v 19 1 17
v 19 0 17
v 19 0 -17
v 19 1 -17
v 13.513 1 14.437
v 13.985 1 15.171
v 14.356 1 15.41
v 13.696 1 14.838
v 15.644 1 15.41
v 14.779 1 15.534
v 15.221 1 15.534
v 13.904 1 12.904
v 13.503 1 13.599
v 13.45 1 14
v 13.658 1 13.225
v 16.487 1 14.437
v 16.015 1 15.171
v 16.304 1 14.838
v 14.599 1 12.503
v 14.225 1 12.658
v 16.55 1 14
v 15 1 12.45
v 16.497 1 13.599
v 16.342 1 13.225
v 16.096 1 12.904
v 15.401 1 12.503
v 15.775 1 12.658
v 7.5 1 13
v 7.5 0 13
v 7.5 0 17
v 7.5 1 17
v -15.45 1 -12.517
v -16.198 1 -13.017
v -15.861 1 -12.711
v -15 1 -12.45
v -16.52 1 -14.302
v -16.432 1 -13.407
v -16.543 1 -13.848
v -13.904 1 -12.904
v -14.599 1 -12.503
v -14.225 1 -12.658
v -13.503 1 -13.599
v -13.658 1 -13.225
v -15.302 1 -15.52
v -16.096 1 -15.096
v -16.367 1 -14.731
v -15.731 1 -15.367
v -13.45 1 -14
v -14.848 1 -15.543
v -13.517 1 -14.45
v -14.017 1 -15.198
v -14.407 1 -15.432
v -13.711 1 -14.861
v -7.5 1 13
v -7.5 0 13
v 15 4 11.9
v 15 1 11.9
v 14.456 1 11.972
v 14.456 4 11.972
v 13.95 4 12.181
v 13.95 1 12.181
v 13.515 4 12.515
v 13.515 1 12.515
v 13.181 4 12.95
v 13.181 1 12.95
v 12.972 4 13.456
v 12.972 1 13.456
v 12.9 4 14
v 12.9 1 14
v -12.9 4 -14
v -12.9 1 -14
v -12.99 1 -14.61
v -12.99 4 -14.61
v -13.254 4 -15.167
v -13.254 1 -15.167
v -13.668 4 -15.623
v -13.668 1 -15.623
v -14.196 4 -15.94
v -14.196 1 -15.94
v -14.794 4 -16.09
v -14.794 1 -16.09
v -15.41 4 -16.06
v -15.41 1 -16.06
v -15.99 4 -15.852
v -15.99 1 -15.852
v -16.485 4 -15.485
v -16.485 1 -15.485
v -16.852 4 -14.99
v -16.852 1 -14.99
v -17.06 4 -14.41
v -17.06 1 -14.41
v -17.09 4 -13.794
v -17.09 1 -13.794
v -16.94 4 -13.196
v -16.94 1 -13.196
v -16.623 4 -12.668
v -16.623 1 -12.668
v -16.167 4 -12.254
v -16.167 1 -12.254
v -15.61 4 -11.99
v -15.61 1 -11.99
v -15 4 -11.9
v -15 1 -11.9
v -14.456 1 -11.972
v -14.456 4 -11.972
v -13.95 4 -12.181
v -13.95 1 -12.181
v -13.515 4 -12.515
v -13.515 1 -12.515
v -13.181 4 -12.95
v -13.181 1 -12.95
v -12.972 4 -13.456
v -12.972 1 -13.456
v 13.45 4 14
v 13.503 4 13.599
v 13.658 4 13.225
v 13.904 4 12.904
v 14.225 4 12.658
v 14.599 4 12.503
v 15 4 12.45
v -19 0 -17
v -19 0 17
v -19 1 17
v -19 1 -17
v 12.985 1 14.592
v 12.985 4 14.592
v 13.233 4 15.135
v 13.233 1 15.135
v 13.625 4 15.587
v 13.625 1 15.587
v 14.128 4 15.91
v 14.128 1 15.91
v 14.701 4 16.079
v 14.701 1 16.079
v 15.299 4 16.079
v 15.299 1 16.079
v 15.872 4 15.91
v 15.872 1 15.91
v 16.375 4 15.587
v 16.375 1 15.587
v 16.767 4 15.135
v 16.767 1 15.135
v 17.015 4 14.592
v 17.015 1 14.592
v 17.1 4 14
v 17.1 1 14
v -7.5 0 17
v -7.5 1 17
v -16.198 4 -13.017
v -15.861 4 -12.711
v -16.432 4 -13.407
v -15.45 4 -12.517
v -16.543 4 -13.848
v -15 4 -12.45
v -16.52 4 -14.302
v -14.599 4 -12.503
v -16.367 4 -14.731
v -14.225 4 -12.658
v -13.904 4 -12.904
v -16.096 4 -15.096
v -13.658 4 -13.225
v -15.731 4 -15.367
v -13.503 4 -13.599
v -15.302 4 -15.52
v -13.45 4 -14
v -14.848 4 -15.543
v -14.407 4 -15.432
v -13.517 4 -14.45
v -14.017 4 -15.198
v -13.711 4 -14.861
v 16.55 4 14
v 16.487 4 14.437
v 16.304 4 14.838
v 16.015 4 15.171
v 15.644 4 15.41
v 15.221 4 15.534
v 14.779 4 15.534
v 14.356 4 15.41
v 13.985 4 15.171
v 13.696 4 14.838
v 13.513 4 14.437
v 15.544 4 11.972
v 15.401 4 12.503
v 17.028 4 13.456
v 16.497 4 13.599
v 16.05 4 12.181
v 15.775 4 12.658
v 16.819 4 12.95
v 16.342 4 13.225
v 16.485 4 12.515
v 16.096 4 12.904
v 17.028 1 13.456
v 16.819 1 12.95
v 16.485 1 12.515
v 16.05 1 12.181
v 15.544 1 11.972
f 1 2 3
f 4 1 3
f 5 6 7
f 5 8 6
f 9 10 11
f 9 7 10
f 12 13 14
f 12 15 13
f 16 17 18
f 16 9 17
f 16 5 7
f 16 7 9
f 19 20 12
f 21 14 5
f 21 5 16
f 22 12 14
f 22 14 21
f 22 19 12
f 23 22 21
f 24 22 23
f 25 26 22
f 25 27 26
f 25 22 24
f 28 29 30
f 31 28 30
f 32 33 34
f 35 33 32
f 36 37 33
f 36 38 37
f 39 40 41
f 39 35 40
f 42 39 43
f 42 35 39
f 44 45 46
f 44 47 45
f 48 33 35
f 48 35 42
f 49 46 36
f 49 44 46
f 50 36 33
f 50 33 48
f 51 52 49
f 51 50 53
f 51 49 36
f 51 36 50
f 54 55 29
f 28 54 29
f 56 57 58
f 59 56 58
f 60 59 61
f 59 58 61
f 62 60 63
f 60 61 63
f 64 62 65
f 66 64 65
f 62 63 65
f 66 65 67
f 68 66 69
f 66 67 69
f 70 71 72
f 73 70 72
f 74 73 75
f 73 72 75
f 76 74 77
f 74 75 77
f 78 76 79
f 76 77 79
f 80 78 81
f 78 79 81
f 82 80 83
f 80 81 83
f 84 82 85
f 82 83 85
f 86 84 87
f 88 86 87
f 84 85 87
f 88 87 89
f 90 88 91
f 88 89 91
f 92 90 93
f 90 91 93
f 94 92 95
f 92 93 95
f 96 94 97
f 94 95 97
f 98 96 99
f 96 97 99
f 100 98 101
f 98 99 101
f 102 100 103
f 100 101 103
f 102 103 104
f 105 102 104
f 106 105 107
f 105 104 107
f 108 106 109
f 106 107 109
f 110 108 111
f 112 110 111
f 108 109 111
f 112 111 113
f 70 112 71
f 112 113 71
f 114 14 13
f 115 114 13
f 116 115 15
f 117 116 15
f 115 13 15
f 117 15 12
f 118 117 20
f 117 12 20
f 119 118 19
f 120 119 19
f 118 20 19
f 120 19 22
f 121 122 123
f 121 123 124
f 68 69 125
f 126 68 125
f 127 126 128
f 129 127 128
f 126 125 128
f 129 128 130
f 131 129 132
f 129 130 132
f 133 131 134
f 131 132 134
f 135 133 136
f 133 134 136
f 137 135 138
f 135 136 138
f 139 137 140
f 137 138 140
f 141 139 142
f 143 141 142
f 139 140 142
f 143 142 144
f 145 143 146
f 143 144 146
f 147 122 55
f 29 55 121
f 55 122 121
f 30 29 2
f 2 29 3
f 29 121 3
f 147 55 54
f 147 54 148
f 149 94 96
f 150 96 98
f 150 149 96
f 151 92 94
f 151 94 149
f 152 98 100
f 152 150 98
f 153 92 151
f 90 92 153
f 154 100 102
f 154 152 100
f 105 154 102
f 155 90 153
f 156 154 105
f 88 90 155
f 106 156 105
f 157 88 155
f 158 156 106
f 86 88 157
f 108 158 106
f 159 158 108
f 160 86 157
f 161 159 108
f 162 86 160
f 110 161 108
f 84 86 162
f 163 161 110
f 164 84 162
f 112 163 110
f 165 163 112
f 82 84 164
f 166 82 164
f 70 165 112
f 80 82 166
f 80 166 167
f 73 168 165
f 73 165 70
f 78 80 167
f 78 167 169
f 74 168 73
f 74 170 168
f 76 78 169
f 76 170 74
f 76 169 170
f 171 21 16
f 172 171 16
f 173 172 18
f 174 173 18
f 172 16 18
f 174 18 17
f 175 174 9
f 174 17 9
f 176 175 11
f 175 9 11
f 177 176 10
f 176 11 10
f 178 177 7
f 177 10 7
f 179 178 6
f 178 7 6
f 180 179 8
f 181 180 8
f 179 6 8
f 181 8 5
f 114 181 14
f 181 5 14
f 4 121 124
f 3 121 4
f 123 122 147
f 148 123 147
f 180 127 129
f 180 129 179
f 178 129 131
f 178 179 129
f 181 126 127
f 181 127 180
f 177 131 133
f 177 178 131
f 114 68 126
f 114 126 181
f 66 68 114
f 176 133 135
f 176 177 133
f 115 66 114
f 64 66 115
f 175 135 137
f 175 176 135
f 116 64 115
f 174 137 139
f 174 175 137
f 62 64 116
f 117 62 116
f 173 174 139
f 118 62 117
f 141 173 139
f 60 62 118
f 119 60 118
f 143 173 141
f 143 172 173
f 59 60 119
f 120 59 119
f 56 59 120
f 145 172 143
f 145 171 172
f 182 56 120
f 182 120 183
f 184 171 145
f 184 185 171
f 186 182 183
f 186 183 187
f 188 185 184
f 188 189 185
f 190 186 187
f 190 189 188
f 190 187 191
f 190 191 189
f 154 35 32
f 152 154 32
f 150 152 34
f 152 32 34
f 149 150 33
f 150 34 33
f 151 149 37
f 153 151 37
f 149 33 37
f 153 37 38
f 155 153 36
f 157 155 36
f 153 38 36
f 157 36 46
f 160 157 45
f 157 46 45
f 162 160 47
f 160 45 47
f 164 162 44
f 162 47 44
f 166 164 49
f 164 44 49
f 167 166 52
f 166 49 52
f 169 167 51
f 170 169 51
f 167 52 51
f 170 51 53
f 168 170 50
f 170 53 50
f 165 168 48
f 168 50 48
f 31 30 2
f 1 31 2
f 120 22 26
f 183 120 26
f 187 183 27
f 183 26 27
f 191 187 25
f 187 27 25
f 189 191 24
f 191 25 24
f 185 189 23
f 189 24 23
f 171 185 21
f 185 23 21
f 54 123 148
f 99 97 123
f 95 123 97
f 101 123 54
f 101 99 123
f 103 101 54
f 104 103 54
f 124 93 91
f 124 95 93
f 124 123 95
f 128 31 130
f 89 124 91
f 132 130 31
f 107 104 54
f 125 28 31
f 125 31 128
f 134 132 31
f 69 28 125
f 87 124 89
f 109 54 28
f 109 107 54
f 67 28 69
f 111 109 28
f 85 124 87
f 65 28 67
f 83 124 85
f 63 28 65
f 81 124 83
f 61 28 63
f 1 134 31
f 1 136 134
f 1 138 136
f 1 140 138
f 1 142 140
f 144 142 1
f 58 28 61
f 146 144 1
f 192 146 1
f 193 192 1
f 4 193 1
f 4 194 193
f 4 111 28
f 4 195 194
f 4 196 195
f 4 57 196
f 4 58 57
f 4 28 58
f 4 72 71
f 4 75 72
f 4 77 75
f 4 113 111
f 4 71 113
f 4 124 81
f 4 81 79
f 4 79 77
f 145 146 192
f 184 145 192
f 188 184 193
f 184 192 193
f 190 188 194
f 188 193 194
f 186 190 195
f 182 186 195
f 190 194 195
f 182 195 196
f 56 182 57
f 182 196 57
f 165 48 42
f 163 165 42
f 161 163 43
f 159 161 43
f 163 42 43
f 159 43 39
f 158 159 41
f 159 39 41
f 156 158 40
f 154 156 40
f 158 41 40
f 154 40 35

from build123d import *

# Parameters (mm, degrees)
SKETCH_1_W          = 38
SKETCH_1_H          = 34
MIDDLE_PLATE_DEPTH  = 1
MIDDLE_PILLAR_DEPTH = 3
C_CUT_REACH         = 27.807
SKETCH_3_W          = 15
SKETCH_3_H          = 4


with BuildPart() as part:
    # 스케치1 → Middle_plate (new body)
    with BuildSketch(Plane(origin=(0, 0, 0), x_dir=(1, 0, 0), z_dir=(0, 1, 0))):
        Rectangle(SKETCH_1_W, SKETCH_1_H)
    extrude(amount=MIDDLE_PLATE_DEPTH)

    # 스케치2 → Middle_pillar (add)
    with BuildSketch(Plane(origin=(0, 1, 0), x_dir=(1, 0, 0), z_dir=(0, 1, 0))):
        with BuildLine():
            ThreePointArc((17.1, -14), (16.48492424, -12.51507576), (15, -11.9))
            Line((15, -11.9), (15, -12.45))
            ThreePointArc((15, -12.45), (16.096015511, -12.903984489), (16.55, -14))
            ThreePointArc((16.55, -14), (15, -15.55), (13.45, -14))
            Line((13.45, -14), (12.9, -14))
            ThreePointArc((12.9, -14), (15, -16.1), (17.1, -14))
        make_face()
        with BuildLine():
            Line((15, -12.45), (15, -11.9))
            ThreePointArc((15, -11.9), (13.51507576, -12.51507576), (12.9, -14))
            Line((12.9, -14), (13.45, -14))
            ThreePointArc((13.45, -14), (13.903984489, -12.903984489), (15, -12.45))
        make_face()
        with BuildLine():
            ThreePointArc((-15, 12.45), (-16.096015511, 15.096015511), (-13.45, 14))
            Line((-13.45, 14), (-12.9, 14))
            ThreePointArc((-12.9, 14), (-16.48492424, 15.48492424), (-15, 11.9))
            Line((-15, 11.9), (-15, 12.45))
        make_face()
        with BuildLine():
            Line((-12.9, 14), (-13.45, 14))
            ThreePointArc((-13.45, 14), (-13.903984489, 12.903984489), (-15, 12.45))
            Line((-15, 12.45), (-15, 11.9))
            ThreePointArc((-15, 11.9), (-13.51507576, 12.51507576), (-12.9, 14))
        make_face()
    extrude(amount=MIDDLE_PILLAR_DEPTH)

    # 스케치3 → C_cut (cut, up to next)
    with BuildSketch(Plane.XZ, mode=Mode.PRIVATE) as c_cut_sk1:
        with Locations((0, 15)):
            Rectangle(SKETCH_3_W, SKETCH_3_H)
    c_cut_tool1 = extrude(c_cut_sk1.sketch, amount=-C_CUT_REACH, mode=Mode.PRIVATE) & part.part
    add(c_cut_tool1.solids().sort_by_distance((0, 0, 15))[0], mode=Mode.SUBTRACT)


solid = part.part
